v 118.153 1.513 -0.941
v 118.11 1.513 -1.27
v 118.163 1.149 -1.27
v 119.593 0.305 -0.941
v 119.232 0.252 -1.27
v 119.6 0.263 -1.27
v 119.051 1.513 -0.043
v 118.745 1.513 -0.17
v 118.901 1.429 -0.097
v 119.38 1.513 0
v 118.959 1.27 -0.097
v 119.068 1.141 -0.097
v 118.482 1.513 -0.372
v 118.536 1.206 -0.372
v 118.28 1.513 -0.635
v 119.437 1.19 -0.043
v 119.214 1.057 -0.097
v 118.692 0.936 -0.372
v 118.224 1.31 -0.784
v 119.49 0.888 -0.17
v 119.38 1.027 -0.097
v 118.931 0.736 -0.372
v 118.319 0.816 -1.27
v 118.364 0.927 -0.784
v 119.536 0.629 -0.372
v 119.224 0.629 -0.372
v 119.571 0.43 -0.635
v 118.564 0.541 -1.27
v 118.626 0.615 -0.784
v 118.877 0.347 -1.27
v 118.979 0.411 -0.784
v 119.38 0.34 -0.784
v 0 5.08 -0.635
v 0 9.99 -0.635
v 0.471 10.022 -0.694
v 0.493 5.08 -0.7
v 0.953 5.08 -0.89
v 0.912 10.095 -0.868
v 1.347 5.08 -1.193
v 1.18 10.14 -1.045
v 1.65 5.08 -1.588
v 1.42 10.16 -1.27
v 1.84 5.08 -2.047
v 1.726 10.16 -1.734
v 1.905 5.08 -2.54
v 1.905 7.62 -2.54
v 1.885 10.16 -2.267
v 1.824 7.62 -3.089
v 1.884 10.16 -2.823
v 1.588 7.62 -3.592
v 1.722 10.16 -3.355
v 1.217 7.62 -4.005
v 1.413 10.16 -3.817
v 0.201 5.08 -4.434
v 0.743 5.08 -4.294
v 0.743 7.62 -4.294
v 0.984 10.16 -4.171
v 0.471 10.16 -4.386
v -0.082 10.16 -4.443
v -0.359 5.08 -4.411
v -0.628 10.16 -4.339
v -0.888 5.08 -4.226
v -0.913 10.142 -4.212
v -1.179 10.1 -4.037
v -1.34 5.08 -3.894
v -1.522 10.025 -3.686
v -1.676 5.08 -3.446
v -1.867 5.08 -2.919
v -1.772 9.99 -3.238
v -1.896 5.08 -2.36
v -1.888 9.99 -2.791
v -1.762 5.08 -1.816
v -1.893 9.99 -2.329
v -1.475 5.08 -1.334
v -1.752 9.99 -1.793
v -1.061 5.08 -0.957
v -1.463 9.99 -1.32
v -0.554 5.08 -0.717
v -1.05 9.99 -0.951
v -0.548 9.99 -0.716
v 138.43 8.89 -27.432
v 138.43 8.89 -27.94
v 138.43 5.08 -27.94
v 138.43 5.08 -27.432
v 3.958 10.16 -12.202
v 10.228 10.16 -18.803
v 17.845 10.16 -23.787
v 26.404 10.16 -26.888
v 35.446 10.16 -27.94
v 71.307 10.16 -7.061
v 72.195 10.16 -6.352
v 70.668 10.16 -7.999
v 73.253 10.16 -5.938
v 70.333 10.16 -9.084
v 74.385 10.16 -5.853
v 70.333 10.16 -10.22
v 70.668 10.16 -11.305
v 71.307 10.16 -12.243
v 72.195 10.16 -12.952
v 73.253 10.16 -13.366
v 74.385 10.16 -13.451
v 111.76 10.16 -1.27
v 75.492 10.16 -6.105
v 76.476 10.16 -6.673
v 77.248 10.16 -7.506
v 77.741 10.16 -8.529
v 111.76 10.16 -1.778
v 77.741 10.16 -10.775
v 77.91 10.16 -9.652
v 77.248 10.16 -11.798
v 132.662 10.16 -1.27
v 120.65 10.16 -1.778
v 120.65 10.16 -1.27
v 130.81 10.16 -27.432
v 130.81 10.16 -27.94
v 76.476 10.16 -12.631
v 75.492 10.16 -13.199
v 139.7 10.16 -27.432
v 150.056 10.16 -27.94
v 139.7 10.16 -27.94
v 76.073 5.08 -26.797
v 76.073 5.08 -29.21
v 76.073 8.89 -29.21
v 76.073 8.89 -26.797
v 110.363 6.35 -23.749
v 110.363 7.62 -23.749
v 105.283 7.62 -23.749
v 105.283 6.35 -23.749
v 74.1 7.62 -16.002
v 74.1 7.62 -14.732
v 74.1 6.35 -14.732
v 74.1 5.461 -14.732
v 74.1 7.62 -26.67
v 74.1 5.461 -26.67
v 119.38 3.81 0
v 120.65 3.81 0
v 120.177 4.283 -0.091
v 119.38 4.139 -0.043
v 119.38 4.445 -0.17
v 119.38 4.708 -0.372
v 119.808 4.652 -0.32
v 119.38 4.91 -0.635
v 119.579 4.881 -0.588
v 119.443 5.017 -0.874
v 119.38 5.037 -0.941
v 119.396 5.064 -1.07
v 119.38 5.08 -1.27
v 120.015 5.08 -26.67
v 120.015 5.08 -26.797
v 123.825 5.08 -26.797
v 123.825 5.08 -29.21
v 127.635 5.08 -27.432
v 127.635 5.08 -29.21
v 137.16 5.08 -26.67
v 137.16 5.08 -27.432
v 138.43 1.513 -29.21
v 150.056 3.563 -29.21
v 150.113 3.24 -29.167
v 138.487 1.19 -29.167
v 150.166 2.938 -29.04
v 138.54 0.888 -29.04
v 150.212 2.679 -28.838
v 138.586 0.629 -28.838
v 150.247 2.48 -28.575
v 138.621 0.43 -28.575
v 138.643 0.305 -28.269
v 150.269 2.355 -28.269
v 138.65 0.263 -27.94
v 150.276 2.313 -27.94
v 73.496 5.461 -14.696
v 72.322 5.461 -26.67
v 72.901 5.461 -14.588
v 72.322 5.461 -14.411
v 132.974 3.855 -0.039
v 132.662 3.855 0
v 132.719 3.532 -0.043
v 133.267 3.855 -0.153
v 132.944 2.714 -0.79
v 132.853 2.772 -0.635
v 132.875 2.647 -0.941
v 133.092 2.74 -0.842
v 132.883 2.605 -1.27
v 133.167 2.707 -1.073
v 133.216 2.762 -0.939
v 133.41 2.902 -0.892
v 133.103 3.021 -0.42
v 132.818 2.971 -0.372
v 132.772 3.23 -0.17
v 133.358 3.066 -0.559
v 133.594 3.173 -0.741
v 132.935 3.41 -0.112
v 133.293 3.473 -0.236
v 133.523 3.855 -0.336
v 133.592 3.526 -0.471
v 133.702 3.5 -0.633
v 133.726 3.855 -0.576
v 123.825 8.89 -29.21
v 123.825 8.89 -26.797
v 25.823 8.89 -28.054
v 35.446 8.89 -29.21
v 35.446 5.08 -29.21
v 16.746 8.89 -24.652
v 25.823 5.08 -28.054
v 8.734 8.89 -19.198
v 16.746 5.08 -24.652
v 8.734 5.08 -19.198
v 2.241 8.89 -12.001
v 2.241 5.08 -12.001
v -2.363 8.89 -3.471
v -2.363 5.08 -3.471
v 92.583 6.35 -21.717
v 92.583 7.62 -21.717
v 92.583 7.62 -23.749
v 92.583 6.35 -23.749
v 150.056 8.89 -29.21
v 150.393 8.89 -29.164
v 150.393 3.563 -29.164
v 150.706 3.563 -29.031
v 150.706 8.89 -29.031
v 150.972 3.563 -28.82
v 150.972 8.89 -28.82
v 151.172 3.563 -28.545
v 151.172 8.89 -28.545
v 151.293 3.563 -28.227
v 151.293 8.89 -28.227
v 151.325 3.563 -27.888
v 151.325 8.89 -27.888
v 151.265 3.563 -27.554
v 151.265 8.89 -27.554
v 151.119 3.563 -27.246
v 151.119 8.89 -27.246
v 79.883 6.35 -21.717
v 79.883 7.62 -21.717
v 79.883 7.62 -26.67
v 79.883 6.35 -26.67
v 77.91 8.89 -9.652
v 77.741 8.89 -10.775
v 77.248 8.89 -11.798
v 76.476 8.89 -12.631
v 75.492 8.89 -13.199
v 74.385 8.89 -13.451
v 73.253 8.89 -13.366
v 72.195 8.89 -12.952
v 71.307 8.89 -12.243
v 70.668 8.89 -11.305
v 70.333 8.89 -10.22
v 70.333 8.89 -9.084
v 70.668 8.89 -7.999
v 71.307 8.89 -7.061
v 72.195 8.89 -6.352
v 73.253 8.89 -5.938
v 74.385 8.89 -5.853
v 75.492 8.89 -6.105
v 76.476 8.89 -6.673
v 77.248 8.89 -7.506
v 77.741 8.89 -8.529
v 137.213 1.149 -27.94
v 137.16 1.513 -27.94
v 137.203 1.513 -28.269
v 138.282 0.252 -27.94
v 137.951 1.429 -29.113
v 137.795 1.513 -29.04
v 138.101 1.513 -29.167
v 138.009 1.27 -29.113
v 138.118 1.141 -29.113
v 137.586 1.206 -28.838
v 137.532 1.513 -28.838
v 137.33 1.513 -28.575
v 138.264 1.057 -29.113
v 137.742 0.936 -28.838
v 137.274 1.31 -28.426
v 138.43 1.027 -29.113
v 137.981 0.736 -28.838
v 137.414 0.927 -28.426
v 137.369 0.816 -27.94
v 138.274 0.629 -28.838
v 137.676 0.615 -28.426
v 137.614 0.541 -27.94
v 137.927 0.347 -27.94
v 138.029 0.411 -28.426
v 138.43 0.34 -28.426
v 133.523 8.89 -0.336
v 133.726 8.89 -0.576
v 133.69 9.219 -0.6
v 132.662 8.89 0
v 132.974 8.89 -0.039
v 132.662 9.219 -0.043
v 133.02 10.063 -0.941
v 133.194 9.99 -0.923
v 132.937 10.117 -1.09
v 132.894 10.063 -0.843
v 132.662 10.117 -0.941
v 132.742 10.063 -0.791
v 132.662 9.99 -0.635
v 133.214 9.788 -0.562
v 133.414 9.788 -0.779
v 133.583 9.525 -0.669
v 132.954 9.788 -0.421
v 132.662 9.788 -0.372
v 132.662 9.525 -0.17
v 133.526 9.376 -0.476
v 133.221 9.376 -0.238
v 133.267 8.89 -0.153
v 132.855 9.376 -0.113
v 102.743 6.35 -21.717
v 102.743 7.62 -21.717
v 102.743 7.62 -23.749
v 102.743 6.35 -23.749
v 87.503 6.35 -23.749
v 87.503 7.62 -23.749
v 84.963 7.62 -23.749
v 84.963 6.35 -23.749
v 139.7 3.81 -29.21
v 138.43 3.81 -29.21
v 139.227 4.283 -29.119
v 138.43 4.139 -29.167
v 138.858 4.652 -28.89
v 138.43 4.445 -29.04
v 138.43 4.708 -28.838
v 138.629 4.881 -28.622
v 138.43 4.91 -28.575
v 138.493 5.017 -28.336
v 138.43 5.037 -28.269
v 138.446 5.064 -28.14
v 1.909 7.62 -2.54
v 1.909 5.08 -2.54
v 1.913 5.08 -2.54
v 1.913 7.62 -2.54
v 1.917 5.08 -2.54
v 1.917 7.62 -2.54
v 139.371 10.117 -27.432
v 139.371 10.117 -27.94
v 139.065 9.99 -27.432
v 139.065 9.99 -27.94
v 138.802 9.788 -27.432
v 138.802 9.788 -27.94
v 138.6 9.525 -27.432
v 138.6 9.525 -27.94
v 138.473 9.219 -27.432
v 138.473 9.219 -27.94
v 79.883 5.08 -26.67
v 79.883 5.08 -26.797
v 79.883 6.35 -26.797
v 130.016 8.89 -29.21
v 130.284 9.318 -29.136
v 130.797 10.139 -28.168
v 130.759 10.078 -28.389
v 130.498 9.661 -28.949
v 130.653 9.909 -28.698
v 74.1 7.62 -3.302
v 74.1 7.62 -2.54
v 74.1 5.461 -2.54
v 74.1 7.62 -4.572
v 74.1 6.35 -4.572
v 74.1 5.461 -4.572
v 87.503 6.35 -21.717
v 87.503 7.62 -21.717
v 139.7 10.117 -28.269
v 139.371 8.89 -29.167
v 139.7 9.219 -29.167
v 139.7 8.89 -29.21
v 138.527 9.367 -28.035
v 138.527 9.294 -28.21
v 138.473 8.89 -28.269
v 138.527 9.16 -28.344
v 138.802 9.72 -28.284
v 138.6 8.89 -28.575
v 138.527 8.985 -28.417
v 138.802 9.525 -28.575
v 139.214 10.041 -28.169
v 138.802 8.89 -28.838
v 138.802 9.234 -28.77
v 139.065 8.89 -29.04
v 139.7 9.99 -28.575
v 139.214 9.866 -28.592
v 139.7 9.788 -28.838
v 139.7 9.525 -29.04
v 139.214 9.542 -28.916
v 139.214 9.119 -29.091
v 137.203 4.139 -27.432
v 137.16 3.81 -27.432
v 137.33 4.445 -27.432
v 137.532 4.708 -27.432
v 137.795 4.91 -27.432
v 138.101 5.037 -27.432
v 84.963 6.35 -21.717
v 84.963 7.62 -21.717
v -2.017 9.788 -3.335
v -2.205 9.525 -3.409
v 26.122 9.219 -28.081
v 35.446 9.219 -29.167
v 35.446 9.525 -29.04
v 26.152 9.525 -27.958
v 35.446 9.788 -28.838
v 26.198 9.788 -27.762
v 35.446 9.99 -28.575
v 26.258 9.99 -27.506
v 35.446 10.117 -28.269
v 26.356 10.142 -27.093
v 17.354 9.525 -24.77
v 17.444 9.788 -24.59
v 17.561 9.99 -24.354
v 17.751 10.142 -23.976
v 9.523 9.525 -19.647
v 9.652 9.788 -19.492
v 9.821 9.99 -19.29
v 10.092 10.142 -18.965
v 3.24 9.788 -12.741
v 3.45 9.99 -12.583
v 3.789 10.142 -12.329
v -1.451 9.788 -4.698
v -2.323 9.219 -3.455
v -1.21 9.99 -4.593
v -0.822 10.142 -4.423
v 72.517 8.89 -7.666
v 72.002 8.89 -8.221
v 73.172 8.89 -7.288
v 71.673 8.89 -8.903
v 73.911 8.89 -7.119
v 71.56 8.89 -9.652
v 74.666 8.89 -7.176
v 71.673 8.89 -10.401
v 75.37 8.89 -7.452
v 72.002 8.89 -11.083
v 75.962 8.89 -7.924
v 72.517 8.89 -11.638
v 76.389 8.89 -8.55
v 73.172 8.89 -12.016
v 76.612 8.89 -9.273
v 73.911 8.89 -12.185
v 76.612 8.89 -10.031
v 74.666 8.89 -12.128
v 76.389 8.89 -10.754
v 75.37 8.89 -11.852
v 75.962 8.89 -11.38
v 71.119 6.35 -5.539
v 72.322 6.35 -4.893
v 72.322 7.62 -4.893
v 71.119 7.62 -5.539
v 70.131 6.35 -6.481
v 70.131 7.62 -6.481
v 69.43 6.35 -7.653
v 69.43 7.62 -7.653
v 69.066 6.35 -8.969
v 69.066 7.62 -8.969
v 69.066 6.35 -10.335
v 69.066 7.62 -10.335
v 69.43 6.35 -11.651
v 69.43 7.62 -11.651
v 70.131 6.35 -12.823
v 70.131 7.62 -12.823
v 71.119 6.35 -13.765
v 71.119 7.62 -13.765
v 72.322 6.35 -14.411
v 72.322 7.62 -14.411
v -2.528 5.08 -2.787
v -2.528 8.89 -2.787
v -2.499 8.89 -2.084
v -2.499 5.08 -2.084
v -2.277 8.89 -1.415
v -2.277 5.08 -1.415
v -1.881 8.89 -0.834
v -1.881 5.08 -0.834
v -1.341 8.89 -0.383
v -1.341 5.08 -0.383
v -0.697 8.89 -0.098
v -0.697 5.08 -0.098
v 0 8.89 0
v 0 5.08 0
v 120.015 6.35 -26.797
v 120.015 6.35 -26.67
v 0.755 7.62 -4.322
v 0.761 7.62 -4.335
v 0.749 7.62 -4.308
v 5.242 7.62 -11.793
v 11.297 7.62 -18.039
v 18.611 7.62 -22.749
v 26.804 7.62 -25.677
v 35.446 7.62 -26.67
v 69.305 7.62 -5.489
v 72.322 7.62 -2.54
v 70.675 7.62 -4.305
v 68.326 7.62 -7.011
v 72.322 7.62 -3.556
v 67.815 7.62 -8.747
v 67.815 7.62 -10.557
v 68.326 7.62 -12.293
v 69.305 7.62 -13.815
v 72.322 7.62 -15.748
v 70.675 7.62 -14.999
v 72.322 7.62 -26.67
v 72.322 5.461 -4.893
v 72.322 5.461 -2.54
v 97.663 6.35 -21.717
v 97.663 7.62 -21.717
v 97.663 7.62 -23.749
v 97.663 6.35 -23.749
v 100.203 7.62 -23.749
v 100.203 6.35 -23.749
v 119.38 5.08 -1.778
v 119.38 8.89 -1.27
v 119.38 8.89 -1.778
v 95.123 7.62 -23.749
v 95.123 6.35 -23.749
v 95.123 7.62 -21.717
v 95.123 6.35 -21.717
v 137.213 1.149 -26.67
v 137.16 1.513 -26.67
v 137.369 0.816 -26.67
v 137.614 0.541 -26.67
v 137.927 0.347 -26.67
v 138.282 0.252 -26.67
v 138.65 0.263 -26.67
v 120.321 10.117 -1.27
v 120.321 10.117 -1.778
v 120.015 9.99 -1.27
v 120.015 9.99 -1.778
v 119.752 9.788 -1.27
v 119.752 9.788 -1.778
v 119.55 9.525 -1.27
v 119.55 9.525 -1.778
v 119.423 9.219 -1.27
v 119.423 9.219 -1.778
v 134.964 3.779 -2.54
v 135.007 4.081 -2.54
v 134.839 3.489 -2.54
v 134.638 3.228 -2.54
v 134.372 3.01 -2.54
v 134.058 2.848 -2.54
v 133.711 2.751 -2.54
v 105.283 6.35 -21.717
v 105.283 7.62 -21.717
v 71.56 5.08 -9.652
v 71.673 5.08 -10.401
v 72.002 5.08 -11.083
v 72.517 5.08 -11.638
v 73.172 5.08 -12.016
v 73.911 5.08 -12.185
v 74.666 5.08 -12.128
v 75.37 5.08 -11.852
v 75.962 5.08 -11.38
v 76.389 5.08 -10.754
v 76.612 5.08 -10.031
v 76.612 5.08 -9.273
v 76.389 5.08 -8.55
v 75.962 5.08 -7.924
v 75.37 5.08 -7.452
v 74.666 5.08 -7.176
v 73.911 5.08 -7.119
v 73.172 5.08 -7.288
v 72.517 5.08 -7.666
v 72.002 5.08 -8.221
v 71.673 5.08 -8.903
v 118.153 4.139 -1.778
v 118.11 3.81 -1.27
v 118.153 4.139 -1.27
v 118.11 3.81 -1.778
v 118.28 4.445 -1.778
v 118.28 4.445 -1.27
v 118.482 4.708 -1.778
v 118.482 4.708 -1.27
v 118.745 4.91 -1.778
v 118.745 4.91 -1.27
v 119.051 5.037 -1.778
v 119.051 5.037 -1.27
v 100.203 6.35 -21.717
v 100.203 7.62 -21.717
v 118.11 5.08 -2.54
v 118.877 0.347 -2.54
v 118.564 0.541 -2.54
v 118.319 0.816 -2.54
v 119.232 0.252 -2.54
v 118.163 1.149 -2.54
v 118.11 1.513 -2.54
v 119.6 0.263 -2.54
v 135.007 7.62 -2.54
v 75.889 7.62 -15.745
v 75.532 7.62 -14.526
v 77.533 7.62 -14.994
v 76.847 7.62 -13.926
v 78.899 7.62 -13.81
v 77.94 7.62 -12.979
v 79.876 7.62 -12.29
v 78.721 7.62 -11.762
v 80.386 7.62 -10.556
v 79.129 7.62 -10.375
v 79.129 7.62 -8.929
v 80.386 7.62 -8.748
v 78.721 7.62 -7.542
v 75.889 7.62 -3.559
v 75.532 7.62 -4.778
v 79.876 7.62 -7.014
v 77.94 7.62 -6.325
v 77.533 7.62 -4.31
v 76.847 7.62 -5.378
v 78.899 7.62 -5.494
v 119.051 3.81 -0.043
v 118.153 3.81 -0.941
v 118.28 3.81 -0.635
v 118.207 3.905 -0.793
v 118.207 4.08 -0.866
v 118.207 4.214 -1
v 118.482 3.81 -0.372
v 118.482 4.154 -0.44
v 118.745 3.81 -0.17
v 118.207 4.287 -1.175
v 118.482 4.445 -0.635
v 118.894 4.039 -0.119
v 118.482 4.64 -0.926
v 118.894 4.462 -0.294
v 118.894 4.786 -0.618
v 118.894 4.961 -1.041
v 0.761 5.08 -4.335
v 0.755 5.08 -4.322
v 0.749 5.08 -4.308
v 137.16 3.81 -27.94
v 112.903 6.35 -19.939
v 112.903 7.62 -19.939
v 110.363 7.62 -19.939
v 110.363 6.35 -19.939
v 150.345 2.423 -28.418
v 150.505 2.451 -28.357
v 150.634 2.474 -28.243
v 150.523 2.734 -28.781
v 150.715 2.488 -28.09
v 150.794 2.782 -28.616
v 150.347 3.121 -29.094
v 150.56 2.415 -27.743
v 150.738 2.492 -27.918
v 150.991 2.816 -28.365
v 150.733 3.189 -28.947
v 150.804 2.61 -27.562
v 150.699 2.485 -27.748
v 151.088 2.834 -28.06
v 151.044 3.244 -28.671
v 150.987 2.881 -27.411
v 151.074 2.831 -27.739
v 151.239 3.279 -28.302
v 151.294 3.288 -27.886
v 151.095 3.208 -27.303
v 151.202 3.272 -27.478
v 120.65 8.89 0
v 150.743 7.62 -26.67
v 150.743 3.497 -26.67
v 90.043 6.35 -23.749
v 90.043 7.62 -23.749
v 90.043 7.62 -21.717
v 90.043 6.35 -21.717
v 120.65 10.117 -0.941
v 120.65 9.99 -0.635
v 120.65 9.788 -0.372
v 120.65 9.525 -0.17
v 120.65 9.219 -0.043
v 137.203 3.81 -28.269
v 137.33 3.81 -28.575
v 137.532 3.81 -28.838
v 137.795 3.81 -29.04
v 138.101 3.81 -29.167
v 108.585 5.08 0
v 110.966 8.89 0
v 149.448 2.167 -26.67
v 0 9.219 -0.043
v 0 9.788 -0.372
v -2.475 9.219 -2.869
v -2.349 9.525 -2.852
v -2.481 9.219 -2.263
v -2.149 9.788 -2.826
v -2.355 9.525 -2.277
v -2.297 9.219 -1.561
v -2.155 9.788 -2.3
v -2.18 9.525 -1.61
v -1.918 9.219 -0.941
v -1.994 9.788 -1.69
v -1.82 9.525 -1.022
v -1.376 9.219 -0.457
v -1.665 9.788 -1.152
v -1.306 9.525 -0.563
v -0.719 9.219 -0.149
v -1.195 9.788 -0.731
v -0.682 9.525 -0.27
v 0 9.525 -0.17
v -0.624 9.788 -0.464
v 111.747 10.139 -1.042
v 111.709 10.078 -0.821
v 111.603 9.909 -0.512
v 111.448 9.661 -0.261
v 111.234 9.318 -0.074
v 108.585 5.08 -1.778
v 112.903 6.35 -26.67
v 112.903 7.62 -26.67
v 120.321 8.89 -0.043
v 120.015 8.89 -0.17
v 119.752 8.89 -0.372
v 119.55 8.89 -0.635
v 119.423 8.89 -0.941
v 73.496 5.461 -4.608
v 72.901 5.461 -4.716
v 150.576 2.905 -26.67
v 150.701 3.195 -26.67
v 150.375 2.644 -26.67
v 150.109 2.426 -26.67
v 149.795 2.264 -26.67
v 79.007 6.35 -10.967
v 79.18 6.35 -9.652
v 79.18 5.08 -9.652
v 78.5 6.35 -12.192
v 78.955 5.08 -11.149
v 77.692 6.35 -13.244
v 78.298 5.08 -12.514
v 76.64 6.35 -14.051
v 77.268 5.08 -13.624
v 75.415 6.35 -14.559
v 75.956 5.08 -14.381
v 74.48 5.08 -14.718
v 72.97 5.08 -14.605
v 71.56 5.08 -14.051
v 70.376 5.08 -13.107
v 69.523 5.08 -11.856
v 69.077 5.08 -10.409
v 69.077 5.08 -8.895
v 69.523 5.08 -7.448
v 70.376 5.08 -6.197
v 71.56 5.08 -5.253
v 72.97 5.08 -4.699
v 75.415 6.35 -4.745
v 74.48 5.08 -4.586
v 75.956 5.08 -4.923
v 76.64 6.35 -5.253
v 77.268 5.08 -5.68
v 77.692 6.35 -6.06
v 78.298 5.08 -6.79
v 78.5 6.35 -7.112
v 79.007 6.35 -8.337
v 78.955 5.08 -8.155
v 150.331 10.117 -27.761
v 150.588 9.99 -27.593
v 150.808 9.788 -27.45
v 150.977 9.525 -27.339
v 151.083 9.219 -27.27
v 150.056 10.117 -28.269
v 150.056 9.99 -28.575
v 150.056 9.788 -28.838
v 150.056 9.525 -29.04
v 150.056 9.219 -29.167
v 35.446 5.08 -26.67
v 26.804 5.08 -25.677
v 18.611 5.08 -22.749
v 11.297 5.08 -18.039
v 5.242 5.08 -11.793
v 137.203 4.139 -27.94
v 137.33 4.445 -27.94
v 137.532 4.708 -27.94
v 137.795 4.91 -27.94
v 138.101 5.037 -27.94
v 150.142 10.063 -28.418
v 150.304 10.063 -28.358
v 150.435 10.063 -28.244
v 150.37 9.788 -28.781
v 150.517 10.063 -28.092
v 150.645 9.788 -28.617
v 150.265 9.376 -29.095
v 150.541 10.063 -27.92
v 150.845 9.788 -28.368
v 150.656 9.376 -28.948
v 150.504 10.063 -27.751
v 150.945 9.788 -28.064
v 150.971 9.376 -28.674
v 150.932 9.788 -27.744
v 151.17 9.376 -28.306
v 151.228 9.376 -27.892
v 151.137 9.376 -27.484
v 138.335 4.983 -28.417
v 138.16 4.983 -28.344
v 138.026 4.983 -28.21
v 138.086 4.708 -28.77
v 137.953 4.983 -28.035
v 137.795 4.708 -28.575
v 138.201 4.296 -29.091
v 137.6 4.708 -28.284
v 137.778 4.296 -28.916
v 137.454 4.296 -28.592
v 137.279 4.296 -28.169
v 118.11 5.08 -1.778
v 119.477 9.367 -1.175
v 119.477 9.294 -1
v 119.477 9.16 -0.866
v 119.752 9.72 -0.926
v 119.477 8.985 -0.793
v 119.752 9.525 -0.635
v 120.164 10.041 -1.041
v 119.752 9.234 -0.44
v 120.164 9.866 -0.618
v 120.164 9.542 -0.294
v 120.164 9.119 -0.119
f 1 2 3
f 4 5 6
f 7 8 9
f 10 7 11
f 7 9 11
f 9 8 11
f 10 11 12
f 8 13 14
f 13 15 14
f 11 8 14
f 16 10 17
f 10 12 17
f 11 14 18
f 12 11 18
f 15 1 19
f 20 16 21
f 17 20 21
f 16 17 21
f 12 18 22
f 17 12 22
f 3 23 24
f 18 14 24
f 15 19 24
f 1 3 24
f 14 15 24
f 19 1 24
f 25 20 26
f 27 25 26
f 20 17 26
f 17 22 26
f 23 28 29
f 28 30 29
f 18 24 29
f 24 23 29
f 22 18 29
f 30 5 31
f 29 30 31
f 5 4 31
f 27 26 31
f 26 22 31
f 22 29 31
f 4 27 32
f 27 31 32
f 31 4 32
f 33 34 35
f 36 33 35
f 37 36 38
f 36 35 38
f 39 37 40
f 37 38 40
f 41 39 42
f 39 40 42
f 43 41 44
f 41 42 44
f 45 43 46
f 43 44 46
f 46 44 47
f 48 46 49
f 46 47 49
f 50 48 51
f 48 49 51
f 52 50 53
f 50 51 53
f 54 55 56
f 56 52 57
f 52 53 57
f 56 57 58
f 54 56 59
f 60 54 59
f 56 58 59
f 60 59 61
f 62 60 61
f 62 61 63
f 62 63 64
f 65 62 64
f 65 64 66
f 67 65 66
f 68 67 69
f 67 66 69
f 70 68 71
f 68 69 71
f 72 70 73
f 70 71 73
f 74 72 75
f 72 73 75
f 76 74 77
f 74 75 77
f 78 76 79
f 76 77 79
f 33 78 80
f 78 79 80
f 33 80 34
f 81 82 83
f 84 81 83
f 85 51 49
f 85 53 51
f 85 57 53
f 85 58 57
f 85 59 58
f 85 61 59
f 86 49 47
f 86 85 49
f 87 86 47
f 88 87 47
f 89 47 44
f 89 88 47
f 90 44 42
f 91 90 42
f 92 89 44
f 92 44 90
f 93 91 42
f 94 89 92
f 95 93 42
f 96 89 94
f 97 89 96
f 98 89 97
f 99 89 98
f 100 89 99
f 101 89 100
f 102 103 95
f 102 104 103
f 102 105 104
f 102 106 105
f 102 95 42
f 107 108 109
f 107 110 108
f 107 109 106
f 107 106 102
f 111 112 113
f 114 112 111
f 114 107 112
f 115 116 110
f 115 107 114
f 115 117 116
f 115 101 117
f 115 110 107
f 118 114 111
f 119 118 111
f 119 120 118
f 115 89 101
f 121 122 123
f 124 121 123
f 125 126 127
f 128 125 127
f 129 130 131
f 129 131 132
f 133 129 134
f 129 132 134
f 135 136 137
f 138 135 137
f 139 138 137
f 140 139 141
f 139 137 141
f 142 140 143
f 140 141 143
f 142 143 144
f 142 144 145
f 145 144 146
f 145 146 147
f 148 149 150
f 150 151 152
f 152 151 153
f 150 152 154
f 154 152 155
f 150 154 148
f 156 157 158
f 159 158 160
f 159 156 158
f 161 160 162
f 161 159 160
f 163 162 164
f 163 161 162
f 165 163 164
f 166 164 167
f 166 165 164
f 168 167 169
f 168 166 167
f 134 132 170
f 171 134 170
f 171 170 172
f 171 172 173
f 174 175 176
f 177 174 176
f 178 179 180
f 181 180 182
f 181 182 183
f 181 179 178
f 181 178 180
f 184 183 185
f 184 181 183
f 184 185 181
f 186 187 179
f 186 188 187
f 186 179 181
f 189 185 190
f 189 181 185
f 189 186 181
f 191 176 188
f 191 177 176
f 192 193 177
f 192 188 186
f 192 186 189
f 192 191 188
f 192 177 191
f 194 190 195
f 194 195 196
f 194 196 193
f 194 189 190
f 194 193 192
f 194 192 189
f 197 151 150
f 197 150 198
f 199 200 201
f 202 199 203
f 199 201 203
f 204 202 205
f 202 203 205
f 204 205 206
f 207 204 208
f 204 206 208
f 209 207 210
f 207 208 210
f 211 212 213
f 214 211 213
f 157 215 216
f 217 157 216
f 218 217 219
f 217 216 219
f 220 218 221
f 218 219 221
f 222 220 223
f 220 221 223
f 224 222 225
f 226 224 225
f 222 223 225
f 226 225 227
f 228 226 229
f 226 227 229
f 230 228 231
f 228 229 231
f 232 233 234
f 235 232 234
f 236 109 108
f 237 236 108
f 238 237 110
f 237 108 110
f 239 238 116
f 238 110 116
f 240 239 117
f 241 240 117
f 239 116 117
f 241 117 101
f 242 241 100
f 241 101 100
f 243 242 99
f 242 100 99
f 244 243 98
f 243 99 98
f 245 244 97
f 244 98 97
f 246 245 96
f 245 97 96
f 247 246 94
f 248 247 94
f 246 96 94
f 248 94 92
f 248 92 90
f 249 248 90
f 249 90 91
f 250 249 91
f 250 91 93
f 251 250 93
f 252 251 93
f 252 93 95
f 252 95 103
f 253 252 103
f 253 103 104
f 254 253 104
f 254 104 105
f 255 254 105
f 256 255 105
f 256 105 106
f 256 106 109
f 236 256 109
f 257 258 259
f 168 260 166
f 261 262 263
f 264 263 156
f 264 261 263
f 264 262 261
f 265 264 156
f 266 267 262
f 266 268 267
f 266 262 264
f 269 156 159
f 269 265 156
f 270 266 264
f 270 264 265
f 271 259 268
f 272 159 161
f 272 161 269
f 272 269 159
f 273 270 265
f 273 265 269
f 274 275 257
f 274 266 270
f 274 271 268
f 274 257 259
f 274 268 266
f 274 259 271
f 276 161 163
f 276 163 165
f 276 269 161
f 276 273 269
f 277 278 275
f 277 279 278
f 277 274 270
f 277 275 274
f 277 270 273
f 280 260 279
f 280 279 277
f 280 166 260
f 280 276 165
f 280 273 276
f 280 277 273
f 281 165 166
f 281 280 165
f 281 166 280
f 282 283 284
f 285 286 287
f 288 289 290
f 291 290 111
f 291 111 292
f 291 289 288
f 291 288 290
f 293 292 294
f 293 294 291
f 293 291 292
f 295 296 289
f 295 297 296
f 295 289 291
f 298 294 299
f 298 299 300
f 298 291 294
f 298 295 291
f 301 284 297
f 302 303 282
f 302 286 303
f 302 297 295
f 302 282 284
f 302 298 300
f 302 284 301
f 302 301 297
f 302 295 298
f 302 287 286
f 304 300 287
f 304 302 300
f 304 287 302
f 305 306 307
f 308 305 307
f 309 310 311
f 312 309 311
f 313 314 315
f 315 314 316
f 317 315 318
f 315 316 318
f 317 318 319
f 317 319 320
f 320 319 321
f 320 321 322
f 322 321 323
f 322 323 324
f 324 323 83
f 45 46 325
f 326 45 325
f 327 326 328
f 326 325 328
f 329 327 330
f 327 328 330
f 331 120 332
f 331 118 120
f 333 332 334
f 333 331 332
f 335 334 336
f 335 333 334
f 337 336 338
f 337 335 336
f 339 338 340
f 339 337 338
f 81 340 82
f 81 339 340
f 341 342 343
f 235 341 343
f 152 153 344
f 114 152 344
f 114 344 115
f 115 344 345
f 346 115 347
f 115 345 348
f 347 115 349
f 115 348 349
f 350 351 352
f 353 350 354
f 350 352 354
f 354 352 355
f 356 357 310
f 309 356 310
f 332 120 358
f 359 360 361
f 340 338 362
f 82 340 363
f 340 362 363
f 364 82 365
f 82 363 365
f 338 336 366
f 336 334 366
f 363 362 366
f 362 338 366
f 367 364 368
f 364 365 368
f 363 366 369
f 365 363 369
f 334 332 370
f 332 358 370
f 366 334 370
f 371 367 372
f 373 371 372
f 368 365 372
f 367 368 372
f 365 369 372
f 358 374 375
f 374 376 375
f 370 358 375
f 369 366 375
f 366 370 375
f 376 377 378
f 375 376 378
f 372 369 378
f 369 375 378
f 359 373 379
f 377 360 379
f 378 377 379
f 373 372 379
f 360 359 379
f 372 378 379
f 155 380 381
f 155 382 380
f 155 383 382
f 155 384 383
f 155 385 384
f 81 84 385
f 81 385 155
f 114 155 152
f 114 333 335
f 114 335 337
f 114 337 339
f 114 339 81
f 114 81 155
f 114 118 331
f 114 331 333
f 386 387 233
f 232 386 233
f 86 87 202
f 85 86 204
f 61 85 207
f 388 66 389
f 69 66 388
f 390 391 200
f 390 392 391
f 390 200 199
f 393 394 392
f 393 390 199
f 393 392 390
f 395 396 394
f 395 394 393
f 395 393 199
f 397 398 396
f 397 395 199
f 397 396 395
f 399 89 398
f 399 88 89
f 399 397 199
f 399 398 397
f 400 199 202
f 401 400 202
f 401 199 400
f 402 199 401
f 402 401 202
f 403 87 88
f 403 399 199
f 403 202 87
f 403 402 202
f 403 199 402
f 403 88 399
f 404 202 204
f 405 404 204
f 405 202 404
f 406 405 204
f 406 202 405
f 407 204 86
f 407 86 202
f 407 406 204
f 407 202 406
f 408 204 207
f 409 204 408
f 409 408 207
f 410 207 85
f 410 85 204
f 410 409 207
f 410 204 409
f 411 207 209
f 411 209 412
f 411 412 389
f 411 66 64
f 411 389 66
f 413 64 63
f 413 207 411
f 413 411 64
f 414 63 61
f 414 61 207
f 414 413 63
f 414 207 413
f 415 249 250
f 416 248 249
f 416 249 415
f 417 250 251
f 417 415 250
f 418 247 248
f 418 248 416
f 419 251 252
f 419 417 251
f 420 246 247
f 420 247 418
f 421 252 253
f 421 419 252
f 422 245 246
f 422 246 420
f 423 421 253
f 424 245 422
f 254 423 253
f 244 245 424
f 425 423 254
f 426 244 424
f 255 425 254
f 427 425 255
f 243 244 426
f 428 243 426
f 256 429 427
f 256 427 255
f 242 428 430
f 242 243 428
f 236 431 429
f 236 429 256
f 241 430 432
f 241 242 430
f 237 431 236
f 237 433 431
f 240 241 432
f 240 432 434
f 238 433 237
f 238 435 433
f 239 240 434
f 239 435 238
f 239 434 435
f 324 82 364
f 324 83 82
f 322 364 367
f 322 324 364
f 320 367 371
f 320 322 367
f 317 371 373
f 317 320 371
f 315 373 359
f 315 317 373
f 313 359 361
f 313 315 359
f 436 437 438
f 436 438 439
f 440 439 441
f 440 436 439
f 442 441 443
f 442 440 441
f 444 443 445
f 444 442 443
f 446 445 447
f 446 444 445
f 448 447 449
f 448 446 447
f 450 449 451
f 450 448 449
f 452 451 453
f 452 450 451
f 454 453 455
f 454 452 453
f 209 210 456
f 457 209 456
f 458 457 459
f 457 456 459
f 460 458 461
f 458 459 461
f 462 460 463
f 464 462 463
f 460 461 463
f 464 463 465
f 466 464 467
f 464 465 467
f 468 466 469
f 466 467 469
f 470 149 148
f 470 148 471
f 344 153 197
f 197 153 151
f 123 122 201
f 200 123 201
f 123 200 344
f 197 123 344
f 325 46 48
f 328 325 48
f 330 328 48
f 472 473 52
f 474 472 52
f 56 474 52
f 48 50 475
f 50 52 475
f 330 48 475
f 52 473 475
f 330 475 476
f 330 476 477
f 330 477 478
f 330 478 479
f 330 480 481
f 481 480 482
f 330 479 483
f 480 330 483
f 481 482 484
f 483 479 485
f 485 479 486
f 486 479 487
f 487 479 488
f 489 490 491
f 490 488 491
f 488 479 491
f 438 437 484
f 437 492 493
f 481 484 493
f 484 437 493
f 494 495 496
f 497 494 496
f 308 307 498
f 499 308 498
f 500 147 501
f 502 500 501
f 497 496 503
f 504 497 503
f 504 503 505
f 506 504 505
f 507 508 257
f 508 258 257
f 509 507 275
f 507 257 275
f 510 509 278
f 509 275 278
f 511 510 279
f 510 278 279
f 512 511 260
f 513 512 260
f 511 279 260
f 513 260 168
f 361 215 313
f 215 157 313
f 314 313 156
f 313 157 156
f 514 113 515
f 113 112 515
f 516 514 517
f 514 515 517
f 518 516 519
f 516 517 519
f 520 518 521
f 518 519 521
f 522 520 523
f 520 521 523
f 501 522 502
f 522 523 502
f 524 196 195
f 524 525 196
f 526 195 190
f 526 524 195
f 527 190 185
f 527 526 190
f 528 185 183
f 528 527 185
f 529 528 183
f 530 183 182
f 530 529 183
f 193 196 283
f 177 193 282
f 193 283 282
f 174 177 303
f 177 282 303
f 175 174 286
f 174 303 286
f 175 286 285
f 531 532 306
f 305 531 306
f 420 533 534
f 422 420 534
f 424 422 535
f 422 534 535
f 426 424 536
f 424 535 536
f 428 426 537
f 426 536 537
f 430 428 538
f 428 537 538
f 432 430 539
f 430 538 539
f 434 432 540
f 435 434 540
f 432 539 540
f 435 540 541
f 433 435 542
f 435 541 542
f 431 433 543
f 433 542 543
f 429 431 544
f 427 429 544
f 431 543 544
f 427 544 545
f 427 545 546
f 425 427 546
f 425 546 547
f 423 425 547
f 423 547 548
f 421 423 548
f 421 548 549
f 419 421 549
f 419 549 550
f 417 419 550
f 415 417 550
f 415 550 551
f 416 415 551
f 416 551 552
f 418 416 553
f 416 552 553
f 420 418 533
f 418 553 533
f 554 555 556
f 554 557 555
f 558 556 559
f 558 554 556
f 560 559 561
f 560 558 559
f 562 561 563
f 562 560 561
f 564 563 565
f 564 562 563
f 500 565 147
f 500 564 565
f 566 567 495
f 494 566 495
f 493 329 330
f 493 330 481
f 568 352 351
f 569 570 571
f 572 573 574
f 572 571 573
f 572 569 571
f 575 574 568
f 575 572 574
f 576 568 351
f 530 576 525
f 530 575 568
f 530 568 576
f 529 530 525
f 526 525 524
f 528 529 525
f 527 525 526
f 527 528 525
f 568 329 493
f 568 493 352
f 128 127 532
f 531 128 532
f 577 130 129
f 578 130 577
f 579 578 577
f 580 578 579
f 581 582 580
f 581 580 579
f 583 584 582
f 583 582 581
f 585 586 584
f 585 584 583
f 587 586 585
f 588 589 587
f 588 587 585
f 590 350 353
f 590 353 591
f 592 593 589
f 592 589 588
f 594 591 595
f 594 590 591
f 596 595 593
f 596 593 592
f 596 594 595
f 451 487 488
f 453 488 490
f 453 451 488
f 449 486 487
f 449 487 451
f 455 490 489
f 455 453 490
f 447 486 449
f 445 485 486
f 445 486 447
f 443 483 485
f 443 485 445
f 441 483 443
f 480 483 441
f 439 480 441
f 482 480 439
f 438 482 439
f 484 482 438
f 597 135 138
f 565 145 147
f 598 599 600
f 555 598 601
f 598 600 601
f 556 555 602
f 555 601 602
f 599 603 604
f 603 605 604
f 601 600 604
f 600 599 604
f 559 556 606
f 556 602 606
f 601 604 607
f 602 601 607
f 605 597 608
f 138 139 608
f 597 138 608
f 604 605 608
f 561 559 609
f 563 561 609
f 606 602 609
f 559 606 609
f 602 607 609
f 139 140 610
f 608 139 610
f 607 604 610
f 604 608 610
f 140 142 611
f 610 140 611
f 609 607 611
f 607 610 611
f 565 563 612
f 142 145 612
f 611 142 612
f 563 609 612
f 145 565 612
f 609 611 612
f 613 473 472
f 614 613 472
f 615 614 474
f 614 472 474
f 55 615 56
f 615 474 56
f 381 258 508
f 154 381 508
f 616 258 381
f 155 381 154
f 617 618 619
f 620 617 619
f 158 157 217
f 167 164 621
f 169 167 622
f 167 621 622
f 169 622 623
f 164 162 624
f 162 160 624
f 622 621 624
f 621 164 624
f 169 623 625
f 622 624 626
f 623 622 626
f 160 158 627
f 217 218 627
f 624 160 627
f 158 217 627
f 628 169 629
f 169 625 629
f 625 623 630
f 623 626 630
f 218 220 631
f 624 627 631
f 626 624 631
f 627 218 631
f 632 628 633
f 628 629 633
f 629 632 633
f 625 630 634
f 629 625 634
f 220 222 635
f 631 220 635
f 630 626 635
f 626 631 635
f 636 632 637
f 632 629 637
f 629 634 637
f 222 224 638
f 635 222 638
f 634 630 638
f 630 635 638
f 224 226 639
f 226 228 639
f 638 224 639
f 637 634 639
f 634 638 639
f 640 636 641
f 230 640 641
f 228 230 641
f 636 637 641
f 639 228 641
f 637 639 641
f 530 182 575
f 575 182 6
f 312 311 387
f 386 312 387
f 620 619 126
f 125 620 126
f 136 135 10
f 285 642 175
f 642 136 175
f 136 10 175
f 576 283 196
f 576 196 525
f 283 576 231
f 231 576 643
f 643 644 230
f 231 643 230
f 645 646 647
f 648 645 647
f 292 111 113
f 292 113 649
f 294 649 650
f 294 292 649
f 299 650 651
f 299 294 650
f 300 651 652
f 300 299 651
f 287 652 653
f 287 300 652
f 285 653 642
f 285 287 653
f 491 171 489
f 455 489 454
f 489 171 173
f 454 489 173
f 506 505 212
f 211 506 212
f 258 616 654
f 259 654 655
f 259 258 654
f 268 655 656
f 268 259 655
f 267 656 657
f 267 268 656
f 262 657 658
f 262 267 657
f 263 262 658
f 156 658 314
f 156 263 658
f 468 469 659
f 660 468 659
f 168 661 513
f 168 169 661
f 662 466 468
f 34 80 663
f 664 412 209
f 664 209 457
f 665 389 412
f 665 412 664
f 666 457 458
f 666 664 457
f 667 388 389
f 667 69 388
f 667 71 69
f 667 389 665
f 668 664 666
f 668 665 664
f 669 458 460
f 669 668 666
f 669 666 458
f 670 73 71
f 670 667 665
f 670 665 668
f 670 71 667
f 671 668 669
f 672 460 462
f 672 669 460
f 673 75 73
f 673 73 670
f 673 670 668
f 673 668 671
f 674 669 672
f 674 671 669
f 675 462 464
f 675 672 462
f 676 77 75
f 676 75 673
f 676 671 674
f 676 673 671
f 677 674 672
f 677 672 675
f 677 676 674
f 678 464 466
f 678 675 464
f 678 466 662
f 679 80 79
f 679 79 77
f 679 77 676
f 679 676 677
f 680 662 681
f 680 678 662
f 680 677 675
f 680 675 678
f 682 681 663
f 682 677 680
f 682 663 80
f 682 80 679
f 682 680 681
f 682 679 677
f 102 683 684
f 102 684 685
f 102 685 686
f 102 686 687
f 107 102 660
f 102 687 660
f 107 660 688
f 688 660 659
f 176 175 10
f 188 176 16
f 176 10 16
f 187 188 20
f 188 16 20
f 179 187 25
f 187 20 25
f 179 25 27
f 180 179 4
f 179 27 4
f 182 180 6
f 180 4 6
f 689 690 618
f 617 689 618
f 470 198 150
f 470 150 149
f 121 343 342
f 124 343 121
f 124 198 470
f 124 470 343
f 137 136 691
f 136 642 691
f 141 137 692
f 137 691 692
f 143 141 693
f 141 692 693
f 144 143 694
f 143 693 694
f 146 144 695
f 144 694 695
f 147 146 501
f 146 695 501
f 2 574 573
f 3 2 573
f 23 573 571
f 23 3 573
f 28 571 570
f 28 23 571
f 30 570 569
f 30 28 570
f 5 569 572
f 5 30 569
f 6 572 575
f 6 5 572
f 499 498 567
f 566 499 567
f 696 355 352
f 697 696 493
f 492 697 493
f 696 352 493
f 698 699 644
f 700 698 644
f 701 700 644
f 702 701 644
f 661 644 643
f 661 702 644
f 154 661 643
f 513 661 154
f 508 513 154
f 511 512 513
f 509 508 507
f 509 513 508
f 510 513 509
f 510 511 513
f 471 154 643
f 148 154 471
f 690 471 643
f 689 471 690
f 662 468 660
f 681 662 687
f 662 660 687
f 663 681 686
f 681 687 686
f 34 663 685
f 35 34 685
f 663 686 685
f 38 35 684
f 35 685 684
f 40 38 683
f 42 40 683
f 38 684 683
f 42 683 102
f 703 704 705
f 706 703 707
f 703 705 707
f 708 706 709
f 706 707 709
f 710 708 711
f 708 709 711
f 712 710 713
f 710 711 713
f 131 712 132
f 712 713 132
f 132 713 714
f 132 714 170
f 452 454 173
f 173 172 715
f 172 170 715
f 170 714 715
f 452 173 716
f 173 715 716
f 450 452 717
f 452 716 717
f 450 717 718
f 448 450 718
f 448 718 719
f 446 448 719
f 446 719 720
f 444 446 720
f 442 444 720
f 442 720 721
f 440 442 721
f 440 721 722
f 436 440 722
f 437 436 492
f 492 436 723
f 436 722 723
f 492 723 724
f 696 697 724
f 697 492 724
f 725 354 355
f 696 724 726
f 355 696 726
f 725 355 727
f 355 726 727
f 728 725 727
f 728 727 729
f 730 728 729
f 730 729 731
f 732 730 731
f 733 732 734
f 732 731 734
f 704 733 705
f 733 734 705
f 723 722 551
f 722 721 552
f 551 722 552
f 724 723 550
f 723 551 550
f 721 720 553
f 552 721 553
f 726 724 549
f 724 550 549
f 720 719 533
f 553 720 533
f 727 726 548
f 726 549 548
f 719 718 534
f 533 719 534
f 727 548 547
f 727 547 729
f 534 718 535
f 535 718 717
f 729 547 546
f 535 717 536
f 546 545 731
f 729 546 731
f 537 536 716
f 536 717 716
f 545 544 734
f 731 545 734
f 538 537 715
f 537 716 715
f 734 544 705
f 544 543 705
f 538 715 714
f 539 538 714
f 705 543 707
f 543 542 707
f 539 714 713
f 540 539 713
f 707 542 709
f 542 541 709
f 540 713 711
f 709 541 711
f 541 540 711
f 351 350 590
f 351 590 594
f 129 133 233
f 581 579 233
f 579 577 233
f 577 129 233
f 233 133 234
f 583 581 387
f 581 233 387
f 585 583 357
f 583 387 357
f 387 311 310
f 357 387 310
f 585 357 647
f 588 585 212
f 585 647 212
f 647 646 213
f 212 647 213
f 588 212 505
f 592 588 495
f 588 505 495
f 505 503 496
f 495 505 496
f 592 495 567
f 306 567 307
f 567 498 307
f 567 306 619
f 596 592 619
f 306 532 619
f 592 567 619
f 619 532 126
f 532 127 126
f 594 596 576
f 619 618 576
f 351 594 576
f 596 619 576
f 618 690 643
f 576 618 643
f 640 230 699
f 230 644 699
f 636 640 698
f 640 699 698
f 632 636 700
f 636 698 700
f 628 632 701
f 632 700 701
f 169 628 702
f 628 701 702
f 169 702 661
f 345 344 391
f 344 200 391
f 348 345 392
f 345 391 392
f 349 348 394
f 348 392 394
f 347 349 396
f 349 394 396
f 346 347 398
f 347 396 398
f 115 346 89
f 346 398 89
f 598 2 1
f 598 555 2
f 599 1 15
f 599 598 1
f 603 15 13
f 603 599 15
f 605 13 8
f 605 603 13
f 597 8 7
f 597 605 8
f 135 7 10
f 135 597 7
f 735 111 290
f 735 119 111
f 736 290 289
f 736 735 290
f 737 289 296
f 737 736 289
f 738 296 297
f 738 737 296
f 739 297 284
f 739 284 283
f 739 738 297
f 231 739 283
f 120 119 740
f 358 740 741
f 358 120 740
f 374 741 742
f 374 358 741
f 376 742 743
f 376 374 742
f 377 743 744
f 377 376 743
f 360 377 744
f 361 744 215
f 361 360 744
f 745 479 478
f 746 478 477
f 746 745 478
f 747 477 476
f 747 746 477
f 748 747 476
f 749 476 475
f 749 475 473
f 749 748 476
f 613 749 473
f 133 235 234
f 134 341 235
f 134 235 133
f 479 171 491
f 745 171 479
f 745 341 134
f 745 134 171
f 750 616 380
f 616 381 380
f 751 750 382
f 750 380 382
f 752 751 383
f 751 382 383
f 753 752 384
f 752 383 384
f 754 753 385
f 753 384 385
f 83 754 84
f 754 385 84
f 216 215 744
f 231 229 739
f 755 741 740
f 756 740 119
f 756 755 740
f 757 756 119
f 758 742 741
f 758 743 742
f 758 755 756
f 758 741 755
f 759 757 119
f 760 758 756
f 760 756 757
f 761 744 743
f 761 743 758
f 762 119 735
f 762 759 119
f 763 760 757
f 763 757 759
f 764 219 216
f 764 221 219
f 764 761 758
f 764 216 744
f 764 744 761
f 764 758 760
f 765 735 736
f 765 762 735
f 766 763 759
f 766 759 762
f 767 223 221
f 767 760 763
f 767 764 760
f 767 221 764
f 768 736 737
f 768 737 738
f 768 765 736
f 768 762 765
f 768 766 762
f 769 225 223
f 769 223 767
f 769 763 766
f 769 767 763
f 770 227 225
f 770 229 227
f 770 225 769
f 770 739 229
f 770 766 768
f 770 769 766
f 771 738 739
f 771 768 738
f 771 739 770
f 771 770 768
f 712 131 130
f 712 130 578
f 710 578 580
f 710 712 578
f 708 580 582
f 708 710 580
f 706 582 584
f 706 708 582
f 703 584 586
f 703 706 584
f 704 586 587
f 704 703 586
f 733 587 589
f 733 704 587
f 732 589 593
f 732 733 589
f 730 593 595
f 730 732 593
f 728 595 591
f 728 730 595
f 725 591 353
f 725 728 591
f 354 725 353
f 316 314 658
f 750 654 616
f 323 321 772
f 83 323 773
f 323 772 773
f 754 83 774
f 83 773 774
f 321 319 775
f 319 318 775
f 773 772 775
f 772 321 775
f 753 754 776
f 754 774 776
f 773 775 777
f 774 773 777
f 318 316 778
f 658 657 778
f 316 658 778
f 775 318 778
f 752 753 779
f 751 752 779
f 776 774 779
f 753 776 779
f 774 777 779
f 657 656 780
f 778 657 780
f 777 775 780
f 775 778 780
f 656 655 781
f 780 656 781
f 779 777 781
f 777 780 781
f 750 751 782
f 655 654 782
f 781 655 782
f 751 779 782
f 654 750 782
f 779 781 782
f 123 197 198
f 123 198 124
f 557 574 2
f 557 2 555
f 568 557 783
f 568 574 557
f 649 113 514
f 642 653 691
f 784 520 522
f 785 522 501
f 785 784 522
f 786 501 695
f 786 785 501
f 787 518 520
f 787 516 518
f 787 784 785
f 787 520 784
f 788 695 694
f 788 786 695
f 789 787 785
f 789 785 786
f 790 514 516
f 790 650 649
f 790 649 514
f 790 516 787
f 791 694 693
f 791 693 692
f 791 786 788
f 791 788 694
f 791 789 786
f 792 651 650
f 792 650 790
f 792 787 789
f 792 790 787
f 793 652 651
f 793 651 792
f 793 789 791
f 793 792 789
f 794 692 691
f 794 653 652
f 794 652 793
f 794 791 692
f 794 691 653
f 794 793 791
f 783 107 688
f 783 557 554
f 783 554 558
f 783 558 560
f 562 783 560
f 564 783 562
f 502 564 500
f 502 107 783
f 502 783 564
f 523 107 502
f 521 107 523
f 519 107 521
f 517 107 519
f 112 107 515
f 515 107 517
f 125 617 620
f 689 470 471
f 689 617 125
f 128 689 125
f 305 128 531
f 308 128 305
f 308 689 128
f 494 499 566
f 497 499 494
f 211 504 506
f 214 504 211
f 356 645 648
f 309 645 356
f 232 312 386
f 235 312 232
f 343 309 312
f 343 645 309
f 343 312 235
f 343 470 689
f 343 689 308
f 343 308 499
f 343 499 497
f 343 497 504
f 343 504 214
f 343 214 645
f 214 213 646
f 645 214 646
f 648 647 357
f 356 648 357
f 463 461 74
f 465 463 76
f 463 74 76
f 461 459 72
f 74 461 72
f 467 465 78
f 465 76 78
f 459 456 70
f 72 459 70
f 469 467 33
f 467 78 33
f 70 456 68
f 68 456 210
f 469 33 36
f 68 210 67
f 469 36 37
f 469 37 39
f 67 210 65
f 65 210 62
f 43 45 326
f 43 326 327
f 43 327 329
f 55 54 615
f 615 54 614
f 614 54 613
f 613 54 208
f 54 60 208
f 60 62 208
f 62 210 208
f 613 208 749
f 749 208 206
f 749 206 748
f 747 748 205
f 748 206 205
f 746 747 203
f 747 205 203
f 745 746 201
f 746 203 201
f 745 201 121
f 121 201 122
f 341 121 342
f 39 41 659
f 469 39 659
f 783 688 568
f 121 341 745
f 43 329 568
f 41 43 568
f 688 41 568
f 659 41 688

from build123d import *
from build123d.topology import SkipClean

# Parameters (mm, degrees)
BOSS_EXTRUDE1_DEPTH                                 = 10.16
CBORE_FOR_0_BINDING_HEAD_MACHINE_SCREW1_D           = 5.08
CBORE_FOR_0_BINDING_HEAD_MACHINE_SCREW1_CBORE_D     = 7.62
CBORE_FOR_0_BINDING_HEAD_MACHINE_SCREW1_CBORE_DEPTH = 1.27
SHELL1_OUTLINE_R                                    = 6.35
SHELL1_DEPTH                                        = 7.62
SHELL1_2_OUTLINE_R                                  = 6.35
SHELL1_2_OUTLINE_R_2                                = 5.08
SHELL1_2_DEPTH                                      = 6.35
CUT_EXTRUDE1_DEPTH                                  = 1.778
CUT_EXTRUDE2_DEPTH                                  = 1.778
CUT_EXTRUDE5_REACH                                  = 157.506
CUT_EXTRUDE6_REACH                                  = 157.506
CUT_EXTRUDE3_DEPTH                                  = 156.506301159
CUT_EXTRUDE3_DEPTH_BACK                             = 156.506301159
SKETCH4_W                                           = 120.65
SKETCH4_H                                           = 5.08
SKETCH5_W                                           = 19.05
SKETCH5_H                                           = 5.08
CUT_EXTRUDE4_DEPTH                                  = 2.54
SKETCH9_W                                           = 47.752
SKETCH9_H                                           = 3.81
CUT_EXTRUDE7_DEPTH                                  = 2.413
FILLET1_R                                           = 1.27
BOSS_EXTRUDE2_DEPTH                                 = 2.54
SKETCH11_W                                          = 40.132
SKETCH11_H                                          = 1.27
CUT_EXTRUDE9_DEPTH                                  = 6.858
SKETCH20_R                                          = 6.35
SKETCH20_R_2                                        = 5.08
CUT_EXTRUDE11_DEPTH                                 = 1.27
BOSS_EXTRUDE4_START                                 = 2.159
BOSS_EXTRUDE4_DEPTH                                 = 2.159
SKETCH36_R                                          = 1.905
CUT_EXTRUDE18_DEPTH                                 = 155.437689597


# Read off the part's stored shape, not the designer's step: Shell1
with BuildPart() as part:
    # Sketch1 → Boss-Extrude1 (new body)
    with BuildSketch(Plane(origin=(0, 0, 0), x_dir=(1, 0, 0), z_dir=(0, 1, 0))):
        with BuildLine():
            Line((0, 0), (133.35, 0))
            Line((133.35, 0), (152.4, 29.21))
            Line((152.4, 29.21), (35.446425772, 29.21))
            ThreePointArc((35.446425772, 29.21), (12.577020299, 22.164640842), (-2.363095051, 3.471333333))
            ThreePointArc((-2.363095051, 3.471333333), (-2.099665053, 1.110662158), (0, 0))
        make_face()
    extrude(amount=BOSS_EXTRUDE1_DEPTH)

    # CBORE for #0 Binding Head Machine Screw1 (through all)
    with Locations(Plane(origin=(0, 10.16, 0), x_dir=(1, 0, 0), z_dir=(0, 1, 0))):
        with Locations((74.100334947, 9.652)):
            CounterBoreHole(CBORE_FOR_0_BINDING_HEAD_MACHINE_SCREW1_D / 2, CBORE_FOR_0_BINDING_HEAD_MACHINE_SCREW1_CBORE_D / 2, CBORE_FOR_0_BINDING_HEAD_MACHINE_SCREW1_CBORE_DEPTH)

    # Shell1 outline → Shell1 (cut)
    with BuildSketch(Plane(origin=(0, 0, 0), x_dir=(1, 0, 0), z_dir=(0, 1, 0))):
        with BuildLine():
            Line((150.743478261, 26.67), (35.446425772, 26.67))
            ThreePointArc((35.446425772, 26.67), (14.006358141, 20.06497579), (0, 2.54))
            Line((0, 2.54), (135.006521739, 2.54))
            Line((135.006521739, 2.54), (150.743478261, 26.67))
        make_face()
        with Locations((74.100334947, 9.652)):
            Circle(SHELL1_OUTLINE_R, mode=Mode.SUBTRACT)
    extrude(amount=SHELL1_DEPTH, mode=Mode.SUBTRACT)

    # Shell1 2 outline → Shell1 2 (cut)
    with BuildSketch(Plane(origin=(0, 0, 0), x_dir=(1, 0, 0), z_dir=(0, 1, 0))):
        with Locations((74.100334947, 9.652)):
            Circle(SHELL1_2_OUTLINE_R)
        with Locations((74.100334947, 9.652)):
            Circle(SHELL1_2_OUTLINE_R_2, mode=Mode.SUBTRACT)
    extrude(amount=SHELL1_2_DEPTH, mode=Mode.SUBTRACT)

    # Sketch2 → Cut-Extrude1 (cut)
    with BuildSketch(Plane.XY):
        Polygon((118.11, 0), (118.11, 5.08), (119.38, 5.08), (119.38, 10.16), (111.76, 10.16), (105.41, 0), align=None)
    extrude(amount=-CUT_EXTRUDE1_DEPTH, mode=Mode.SUBTRACT)

    # Sketch3 → Cut-Extrude2 (cut)
    with BuildSketch(Plane(origin=(0, 0, -29.21), x_dir=(-1, 0, 0), z_dir=(0, 0, -1))):
        Polygon((-138.43, 10.16), (-138.43, 5.08), (-137.16, 5.08), (-137.16, 0), (-124.46, 0), (-130.81, 10.16), align=None)
    extrude(amount=-CUT_EXTRUDE2_DEPTH, mode=Mode.SUBTRACT)

    # Cut-Extrude5: up to this face of the body (flat: up to its plane)
    cut_extrude5_end = Plane(part.part.faces().sort_by_distance((67.503260869, 3.81, -2.54))[0])
    # Sketch7 → Cut-Extrude5 (cut, up to the picked face)
    with BuildSketch(Plane.XY, mode=Mode.PRIVATE) as cut_extrude5_sk1:
        Polygon((135.006521739, 2.979312663), (118.11, 0), (135.006521739, 0), align=None)
    cut_extrude5_tool1 = split(extrude(cut_extrude5_sk1.sketch, amount=-CUT_EXTRUDE5_REACH, mode=Mode.PRIVATE), bisect_by=cut_extrude5_end, keep=Keep.BOTH, mode=Mode.PRIVATE)
    add(cut_extrude5_tool1.solids().sort_by(Axis((129.374348, 0.993104, 0), (0, 0, -1)))[0], mode=Mode.SUBTRACT)

    # Cut-Extrude6: up to this face of the body (flat: up to its plane)
    cut_extrude6_end = Plane(part.part.faces().sort_by_distance((93.094952017, 3.81, -26.67))[0])
    # Sketch8 → Cut-Extrude6 (cut, up to the picked face)
    with BuildSketch(Plane(origin=(0, 0, -29.21), x_dir=(-1, 0, 0), z_dir=(0, 0, -1)), mode=Mode.PRIVATE) as cut_extrude6_sk1:
        Polygon((-152.4, 2.687223186), (-137.16, 0), (-152.4, 0), align=None)
    cut_extrude6_tool1 = split(extrude(cut_extrude6_sk1.sketch, amount=-CUT_EXTRUDE6_REACH, mode=Mode.PRIVATE), bisect_by=cut_extrude6_end, keep=Keep.BOTH, mode=Mode.PRIVATE)
    add(cut_extrude6_tool1.solids().sort_by(Axis((147.32, 0.895741, -29.21), (0, 0, 1)))[0], mode=Mode.SUBTRACT)

    # Sketch4 → Cut-Extrude3 (cut, two sides: drawn at the far end of the back side and taken through both)
    with BuildSketch(Plane.XY.offset(-CUT_EXTRUDE3_DEPTH_BACK)):
        with Locations((57.785, 2.54)):
            Rectangle(SKETCH4_W, SKETCH4_H)
    extrude(amount=CUT_EXTRUDE3_DEPTH + CUT_EXTRUDE3_DEPTH_BACK, mode=Mode.SUBTRACT)

    # Sketch5 → Cut-Extrude4 (cut)
    with BuildSketch(Plane(origin=(0, 0, -29.21), x_dir=(-1, 0, 0), z_dir=(0, 0, -1))):
        with Locations((-127.635, 2.54)):
            Rectangle(SKETCH5_W, SKETCH5_H)
    extrude(amount=-CUT_EXTRUDE4_DEPTH, mode=Mode.SUBTRACT)

    # Sketch9 → Cut-Extrude7 (cut)
    with BuildSketch(Plane(origin=(0, 0, -29.21), x_dir=(-1, 0, 0), z_dir=(0, 0, -1))):
        with Locations((-99.949, 6.985)):
            Rectangle(SKETCH9_W, SKETCH9_H)
    extrude(amount=-CUT_EXTRUDE7_DEPTH, mode=Mode.SUBTRACT)

    # Fillet1
    fillet1_edges = [part.edges().sort_by_distance(p)[0] for p in [
        (145.415, 10.16, -29.21),
        (142.875, 10.16, -14.605),
        (126.365, 10.16, 0),
        (119.38, 10.16, -0.889),
        (55.88, 10.16, 0),
        (-2.099665053, 10.16, -1.110662158),
        (12.577020299, 10.16, -22.164640842),
        (83.128212886, 10.16, -29.21),
        (138.43, 10.16, -28.321),
        (133.35, 6.423611593, 0),
        (152.4, 6.423611593, -29.21),
        (0, 6.35, -2.54),
        (118.745, 5.08, 0),
        (118.11, 2.54, 0),
        (119.38, 7.62, 0),
        (137.16, 2.54, -29.21),
        (137.795, 5.08, -29.21),
        (138.43, 7.62, -29.21),
        (144.78, 1.343611593, -29.21),
        (125.73, 1.343611593, 0),
        (151.57173913, 2.541178448, -27.94),
        (134.17826087, 2.833267924, -1.27),
        (137.16, 5.08, -28.321),
        (118.11, 0, -1.27),
        (118.11, 5.08, -0.889),
        (137.16, 0, -27.94),
    ]]
    fillet(fillet1_edges, radius=FILLET1_R - 0.0001)  # a hair under: the kernel refuses the full size

    # Sketch10 → Boss-Extrude2 (add)
    with BuildSketch(Plane.XZ.offset(-7.62)):
        Polygon((79.883, -21.717), (79.883, -26.67), (112.903, -26.67), (112.903, -19.939), (110.363, -19.939), (110.363, -23.749), (105.283, -23.749), (105.283, -21.717), (102.743, -21.717), (102.743, -23.749), (100.203, -23.749), (100.203, -21.717), (97.663, -21.717), (97.663, -23.749), (95.123, -23.749), (95.123, -21.717), (92.583, -21.717), (92.583, -23.749), (90.043, -23.749), (90.043, -21.717), (87.503, -21.717), (87.503, -23.749), (84.963, -23.749), (84.963, -21.717), align=None)
    extrude(amount=BOSS_EXTRUDE2_DEPTH)

    # Sketch11 → Cut-Extrude9 (cut)
    with BuildSketch(Plane(origin=(0, 0, -26.797), x_dir=(-1, 0, 0), z_dir=(0, 0, -1))):
        with Locations((-99.949, 5.715)):
            Rectangle(SKETCH11_W, SKETCH11_H)
    extrude(amount=-CUT_EXTRUDE9_DEPTH, mode=Mode.SUBTRACT)

    # Sketch20 → Cut-Extrude11 (cut)
    with SkipClean():  # the faces are left unmerged after this step: merging them gives an invalid solid
        with BuildSketch(Plane.XZ.offset(-6.35)):
            with Locations((74.100334947, -9.652)):
                Circle(SKETCH20_R)
            with Locations(Location((74.100334947, -9.652, 0), (0, 0, 90))):
                Circle(SKETCH20_R_2, mode=Mode.SUBTRACT)
        extrude(amount=-CUT_EXTRUDE11_DEPTH, mode=Mode.SUBTRACT)

    # Sketch21 → Boss-Extrude4 (add)
    with BuildSketch(Plane.XZ.offset(-7.62).offset(BOSS_EXTRUDE4_START)):
        with BuildLine():
            Line((74.100334947, -2.54), (74.100334947, -4.572))
            ThreePointArc((74.100334947, -4.572), (73.196935106, -4.652973222), (72.322334947, -4.893311525))
            Line((72.322334947, -4.893311525), (72.322334947, -2.54))
            Line((72.322334947, -2.54), (74.100334947, -2.54))
        make_face()
        with BuildLine():
            Line((74.100334947, -14.732), (74.100334947, -26.67))
            Line((74.100334947, -26.67), (72.322334947, -26.67))
            Line((72.322334947, -26.67), (72.322334947, -14.410688475))
            ThreePointArc((72.322334947, -14.410688475), (73.196935106, -14.651026778), (74.100334947, -14.732))
        make_face()
    extrude(amount=-BOSS_EXTRUDE4_DEPTH)

    # Sketch36 → Cut-Extrude18 (cut, through all)
    with SkipClean():  # the faces are left unmerged after this step: merging them gives an invalid solid
        with BuildSketch(Plane(origin=(0, 10.16, 0), x_dir=(1, 0, 0), z_dir=(0, 1, 0))):
            with Locations(Location((0, 2.54, 0), (0, 0, 270))):
                Circle(SKETCH36_R)
        extrude(amount=-CUT_EXTRUDE18_DEPTH, mode=Mode.SUBTRACT)


solid = part.part
